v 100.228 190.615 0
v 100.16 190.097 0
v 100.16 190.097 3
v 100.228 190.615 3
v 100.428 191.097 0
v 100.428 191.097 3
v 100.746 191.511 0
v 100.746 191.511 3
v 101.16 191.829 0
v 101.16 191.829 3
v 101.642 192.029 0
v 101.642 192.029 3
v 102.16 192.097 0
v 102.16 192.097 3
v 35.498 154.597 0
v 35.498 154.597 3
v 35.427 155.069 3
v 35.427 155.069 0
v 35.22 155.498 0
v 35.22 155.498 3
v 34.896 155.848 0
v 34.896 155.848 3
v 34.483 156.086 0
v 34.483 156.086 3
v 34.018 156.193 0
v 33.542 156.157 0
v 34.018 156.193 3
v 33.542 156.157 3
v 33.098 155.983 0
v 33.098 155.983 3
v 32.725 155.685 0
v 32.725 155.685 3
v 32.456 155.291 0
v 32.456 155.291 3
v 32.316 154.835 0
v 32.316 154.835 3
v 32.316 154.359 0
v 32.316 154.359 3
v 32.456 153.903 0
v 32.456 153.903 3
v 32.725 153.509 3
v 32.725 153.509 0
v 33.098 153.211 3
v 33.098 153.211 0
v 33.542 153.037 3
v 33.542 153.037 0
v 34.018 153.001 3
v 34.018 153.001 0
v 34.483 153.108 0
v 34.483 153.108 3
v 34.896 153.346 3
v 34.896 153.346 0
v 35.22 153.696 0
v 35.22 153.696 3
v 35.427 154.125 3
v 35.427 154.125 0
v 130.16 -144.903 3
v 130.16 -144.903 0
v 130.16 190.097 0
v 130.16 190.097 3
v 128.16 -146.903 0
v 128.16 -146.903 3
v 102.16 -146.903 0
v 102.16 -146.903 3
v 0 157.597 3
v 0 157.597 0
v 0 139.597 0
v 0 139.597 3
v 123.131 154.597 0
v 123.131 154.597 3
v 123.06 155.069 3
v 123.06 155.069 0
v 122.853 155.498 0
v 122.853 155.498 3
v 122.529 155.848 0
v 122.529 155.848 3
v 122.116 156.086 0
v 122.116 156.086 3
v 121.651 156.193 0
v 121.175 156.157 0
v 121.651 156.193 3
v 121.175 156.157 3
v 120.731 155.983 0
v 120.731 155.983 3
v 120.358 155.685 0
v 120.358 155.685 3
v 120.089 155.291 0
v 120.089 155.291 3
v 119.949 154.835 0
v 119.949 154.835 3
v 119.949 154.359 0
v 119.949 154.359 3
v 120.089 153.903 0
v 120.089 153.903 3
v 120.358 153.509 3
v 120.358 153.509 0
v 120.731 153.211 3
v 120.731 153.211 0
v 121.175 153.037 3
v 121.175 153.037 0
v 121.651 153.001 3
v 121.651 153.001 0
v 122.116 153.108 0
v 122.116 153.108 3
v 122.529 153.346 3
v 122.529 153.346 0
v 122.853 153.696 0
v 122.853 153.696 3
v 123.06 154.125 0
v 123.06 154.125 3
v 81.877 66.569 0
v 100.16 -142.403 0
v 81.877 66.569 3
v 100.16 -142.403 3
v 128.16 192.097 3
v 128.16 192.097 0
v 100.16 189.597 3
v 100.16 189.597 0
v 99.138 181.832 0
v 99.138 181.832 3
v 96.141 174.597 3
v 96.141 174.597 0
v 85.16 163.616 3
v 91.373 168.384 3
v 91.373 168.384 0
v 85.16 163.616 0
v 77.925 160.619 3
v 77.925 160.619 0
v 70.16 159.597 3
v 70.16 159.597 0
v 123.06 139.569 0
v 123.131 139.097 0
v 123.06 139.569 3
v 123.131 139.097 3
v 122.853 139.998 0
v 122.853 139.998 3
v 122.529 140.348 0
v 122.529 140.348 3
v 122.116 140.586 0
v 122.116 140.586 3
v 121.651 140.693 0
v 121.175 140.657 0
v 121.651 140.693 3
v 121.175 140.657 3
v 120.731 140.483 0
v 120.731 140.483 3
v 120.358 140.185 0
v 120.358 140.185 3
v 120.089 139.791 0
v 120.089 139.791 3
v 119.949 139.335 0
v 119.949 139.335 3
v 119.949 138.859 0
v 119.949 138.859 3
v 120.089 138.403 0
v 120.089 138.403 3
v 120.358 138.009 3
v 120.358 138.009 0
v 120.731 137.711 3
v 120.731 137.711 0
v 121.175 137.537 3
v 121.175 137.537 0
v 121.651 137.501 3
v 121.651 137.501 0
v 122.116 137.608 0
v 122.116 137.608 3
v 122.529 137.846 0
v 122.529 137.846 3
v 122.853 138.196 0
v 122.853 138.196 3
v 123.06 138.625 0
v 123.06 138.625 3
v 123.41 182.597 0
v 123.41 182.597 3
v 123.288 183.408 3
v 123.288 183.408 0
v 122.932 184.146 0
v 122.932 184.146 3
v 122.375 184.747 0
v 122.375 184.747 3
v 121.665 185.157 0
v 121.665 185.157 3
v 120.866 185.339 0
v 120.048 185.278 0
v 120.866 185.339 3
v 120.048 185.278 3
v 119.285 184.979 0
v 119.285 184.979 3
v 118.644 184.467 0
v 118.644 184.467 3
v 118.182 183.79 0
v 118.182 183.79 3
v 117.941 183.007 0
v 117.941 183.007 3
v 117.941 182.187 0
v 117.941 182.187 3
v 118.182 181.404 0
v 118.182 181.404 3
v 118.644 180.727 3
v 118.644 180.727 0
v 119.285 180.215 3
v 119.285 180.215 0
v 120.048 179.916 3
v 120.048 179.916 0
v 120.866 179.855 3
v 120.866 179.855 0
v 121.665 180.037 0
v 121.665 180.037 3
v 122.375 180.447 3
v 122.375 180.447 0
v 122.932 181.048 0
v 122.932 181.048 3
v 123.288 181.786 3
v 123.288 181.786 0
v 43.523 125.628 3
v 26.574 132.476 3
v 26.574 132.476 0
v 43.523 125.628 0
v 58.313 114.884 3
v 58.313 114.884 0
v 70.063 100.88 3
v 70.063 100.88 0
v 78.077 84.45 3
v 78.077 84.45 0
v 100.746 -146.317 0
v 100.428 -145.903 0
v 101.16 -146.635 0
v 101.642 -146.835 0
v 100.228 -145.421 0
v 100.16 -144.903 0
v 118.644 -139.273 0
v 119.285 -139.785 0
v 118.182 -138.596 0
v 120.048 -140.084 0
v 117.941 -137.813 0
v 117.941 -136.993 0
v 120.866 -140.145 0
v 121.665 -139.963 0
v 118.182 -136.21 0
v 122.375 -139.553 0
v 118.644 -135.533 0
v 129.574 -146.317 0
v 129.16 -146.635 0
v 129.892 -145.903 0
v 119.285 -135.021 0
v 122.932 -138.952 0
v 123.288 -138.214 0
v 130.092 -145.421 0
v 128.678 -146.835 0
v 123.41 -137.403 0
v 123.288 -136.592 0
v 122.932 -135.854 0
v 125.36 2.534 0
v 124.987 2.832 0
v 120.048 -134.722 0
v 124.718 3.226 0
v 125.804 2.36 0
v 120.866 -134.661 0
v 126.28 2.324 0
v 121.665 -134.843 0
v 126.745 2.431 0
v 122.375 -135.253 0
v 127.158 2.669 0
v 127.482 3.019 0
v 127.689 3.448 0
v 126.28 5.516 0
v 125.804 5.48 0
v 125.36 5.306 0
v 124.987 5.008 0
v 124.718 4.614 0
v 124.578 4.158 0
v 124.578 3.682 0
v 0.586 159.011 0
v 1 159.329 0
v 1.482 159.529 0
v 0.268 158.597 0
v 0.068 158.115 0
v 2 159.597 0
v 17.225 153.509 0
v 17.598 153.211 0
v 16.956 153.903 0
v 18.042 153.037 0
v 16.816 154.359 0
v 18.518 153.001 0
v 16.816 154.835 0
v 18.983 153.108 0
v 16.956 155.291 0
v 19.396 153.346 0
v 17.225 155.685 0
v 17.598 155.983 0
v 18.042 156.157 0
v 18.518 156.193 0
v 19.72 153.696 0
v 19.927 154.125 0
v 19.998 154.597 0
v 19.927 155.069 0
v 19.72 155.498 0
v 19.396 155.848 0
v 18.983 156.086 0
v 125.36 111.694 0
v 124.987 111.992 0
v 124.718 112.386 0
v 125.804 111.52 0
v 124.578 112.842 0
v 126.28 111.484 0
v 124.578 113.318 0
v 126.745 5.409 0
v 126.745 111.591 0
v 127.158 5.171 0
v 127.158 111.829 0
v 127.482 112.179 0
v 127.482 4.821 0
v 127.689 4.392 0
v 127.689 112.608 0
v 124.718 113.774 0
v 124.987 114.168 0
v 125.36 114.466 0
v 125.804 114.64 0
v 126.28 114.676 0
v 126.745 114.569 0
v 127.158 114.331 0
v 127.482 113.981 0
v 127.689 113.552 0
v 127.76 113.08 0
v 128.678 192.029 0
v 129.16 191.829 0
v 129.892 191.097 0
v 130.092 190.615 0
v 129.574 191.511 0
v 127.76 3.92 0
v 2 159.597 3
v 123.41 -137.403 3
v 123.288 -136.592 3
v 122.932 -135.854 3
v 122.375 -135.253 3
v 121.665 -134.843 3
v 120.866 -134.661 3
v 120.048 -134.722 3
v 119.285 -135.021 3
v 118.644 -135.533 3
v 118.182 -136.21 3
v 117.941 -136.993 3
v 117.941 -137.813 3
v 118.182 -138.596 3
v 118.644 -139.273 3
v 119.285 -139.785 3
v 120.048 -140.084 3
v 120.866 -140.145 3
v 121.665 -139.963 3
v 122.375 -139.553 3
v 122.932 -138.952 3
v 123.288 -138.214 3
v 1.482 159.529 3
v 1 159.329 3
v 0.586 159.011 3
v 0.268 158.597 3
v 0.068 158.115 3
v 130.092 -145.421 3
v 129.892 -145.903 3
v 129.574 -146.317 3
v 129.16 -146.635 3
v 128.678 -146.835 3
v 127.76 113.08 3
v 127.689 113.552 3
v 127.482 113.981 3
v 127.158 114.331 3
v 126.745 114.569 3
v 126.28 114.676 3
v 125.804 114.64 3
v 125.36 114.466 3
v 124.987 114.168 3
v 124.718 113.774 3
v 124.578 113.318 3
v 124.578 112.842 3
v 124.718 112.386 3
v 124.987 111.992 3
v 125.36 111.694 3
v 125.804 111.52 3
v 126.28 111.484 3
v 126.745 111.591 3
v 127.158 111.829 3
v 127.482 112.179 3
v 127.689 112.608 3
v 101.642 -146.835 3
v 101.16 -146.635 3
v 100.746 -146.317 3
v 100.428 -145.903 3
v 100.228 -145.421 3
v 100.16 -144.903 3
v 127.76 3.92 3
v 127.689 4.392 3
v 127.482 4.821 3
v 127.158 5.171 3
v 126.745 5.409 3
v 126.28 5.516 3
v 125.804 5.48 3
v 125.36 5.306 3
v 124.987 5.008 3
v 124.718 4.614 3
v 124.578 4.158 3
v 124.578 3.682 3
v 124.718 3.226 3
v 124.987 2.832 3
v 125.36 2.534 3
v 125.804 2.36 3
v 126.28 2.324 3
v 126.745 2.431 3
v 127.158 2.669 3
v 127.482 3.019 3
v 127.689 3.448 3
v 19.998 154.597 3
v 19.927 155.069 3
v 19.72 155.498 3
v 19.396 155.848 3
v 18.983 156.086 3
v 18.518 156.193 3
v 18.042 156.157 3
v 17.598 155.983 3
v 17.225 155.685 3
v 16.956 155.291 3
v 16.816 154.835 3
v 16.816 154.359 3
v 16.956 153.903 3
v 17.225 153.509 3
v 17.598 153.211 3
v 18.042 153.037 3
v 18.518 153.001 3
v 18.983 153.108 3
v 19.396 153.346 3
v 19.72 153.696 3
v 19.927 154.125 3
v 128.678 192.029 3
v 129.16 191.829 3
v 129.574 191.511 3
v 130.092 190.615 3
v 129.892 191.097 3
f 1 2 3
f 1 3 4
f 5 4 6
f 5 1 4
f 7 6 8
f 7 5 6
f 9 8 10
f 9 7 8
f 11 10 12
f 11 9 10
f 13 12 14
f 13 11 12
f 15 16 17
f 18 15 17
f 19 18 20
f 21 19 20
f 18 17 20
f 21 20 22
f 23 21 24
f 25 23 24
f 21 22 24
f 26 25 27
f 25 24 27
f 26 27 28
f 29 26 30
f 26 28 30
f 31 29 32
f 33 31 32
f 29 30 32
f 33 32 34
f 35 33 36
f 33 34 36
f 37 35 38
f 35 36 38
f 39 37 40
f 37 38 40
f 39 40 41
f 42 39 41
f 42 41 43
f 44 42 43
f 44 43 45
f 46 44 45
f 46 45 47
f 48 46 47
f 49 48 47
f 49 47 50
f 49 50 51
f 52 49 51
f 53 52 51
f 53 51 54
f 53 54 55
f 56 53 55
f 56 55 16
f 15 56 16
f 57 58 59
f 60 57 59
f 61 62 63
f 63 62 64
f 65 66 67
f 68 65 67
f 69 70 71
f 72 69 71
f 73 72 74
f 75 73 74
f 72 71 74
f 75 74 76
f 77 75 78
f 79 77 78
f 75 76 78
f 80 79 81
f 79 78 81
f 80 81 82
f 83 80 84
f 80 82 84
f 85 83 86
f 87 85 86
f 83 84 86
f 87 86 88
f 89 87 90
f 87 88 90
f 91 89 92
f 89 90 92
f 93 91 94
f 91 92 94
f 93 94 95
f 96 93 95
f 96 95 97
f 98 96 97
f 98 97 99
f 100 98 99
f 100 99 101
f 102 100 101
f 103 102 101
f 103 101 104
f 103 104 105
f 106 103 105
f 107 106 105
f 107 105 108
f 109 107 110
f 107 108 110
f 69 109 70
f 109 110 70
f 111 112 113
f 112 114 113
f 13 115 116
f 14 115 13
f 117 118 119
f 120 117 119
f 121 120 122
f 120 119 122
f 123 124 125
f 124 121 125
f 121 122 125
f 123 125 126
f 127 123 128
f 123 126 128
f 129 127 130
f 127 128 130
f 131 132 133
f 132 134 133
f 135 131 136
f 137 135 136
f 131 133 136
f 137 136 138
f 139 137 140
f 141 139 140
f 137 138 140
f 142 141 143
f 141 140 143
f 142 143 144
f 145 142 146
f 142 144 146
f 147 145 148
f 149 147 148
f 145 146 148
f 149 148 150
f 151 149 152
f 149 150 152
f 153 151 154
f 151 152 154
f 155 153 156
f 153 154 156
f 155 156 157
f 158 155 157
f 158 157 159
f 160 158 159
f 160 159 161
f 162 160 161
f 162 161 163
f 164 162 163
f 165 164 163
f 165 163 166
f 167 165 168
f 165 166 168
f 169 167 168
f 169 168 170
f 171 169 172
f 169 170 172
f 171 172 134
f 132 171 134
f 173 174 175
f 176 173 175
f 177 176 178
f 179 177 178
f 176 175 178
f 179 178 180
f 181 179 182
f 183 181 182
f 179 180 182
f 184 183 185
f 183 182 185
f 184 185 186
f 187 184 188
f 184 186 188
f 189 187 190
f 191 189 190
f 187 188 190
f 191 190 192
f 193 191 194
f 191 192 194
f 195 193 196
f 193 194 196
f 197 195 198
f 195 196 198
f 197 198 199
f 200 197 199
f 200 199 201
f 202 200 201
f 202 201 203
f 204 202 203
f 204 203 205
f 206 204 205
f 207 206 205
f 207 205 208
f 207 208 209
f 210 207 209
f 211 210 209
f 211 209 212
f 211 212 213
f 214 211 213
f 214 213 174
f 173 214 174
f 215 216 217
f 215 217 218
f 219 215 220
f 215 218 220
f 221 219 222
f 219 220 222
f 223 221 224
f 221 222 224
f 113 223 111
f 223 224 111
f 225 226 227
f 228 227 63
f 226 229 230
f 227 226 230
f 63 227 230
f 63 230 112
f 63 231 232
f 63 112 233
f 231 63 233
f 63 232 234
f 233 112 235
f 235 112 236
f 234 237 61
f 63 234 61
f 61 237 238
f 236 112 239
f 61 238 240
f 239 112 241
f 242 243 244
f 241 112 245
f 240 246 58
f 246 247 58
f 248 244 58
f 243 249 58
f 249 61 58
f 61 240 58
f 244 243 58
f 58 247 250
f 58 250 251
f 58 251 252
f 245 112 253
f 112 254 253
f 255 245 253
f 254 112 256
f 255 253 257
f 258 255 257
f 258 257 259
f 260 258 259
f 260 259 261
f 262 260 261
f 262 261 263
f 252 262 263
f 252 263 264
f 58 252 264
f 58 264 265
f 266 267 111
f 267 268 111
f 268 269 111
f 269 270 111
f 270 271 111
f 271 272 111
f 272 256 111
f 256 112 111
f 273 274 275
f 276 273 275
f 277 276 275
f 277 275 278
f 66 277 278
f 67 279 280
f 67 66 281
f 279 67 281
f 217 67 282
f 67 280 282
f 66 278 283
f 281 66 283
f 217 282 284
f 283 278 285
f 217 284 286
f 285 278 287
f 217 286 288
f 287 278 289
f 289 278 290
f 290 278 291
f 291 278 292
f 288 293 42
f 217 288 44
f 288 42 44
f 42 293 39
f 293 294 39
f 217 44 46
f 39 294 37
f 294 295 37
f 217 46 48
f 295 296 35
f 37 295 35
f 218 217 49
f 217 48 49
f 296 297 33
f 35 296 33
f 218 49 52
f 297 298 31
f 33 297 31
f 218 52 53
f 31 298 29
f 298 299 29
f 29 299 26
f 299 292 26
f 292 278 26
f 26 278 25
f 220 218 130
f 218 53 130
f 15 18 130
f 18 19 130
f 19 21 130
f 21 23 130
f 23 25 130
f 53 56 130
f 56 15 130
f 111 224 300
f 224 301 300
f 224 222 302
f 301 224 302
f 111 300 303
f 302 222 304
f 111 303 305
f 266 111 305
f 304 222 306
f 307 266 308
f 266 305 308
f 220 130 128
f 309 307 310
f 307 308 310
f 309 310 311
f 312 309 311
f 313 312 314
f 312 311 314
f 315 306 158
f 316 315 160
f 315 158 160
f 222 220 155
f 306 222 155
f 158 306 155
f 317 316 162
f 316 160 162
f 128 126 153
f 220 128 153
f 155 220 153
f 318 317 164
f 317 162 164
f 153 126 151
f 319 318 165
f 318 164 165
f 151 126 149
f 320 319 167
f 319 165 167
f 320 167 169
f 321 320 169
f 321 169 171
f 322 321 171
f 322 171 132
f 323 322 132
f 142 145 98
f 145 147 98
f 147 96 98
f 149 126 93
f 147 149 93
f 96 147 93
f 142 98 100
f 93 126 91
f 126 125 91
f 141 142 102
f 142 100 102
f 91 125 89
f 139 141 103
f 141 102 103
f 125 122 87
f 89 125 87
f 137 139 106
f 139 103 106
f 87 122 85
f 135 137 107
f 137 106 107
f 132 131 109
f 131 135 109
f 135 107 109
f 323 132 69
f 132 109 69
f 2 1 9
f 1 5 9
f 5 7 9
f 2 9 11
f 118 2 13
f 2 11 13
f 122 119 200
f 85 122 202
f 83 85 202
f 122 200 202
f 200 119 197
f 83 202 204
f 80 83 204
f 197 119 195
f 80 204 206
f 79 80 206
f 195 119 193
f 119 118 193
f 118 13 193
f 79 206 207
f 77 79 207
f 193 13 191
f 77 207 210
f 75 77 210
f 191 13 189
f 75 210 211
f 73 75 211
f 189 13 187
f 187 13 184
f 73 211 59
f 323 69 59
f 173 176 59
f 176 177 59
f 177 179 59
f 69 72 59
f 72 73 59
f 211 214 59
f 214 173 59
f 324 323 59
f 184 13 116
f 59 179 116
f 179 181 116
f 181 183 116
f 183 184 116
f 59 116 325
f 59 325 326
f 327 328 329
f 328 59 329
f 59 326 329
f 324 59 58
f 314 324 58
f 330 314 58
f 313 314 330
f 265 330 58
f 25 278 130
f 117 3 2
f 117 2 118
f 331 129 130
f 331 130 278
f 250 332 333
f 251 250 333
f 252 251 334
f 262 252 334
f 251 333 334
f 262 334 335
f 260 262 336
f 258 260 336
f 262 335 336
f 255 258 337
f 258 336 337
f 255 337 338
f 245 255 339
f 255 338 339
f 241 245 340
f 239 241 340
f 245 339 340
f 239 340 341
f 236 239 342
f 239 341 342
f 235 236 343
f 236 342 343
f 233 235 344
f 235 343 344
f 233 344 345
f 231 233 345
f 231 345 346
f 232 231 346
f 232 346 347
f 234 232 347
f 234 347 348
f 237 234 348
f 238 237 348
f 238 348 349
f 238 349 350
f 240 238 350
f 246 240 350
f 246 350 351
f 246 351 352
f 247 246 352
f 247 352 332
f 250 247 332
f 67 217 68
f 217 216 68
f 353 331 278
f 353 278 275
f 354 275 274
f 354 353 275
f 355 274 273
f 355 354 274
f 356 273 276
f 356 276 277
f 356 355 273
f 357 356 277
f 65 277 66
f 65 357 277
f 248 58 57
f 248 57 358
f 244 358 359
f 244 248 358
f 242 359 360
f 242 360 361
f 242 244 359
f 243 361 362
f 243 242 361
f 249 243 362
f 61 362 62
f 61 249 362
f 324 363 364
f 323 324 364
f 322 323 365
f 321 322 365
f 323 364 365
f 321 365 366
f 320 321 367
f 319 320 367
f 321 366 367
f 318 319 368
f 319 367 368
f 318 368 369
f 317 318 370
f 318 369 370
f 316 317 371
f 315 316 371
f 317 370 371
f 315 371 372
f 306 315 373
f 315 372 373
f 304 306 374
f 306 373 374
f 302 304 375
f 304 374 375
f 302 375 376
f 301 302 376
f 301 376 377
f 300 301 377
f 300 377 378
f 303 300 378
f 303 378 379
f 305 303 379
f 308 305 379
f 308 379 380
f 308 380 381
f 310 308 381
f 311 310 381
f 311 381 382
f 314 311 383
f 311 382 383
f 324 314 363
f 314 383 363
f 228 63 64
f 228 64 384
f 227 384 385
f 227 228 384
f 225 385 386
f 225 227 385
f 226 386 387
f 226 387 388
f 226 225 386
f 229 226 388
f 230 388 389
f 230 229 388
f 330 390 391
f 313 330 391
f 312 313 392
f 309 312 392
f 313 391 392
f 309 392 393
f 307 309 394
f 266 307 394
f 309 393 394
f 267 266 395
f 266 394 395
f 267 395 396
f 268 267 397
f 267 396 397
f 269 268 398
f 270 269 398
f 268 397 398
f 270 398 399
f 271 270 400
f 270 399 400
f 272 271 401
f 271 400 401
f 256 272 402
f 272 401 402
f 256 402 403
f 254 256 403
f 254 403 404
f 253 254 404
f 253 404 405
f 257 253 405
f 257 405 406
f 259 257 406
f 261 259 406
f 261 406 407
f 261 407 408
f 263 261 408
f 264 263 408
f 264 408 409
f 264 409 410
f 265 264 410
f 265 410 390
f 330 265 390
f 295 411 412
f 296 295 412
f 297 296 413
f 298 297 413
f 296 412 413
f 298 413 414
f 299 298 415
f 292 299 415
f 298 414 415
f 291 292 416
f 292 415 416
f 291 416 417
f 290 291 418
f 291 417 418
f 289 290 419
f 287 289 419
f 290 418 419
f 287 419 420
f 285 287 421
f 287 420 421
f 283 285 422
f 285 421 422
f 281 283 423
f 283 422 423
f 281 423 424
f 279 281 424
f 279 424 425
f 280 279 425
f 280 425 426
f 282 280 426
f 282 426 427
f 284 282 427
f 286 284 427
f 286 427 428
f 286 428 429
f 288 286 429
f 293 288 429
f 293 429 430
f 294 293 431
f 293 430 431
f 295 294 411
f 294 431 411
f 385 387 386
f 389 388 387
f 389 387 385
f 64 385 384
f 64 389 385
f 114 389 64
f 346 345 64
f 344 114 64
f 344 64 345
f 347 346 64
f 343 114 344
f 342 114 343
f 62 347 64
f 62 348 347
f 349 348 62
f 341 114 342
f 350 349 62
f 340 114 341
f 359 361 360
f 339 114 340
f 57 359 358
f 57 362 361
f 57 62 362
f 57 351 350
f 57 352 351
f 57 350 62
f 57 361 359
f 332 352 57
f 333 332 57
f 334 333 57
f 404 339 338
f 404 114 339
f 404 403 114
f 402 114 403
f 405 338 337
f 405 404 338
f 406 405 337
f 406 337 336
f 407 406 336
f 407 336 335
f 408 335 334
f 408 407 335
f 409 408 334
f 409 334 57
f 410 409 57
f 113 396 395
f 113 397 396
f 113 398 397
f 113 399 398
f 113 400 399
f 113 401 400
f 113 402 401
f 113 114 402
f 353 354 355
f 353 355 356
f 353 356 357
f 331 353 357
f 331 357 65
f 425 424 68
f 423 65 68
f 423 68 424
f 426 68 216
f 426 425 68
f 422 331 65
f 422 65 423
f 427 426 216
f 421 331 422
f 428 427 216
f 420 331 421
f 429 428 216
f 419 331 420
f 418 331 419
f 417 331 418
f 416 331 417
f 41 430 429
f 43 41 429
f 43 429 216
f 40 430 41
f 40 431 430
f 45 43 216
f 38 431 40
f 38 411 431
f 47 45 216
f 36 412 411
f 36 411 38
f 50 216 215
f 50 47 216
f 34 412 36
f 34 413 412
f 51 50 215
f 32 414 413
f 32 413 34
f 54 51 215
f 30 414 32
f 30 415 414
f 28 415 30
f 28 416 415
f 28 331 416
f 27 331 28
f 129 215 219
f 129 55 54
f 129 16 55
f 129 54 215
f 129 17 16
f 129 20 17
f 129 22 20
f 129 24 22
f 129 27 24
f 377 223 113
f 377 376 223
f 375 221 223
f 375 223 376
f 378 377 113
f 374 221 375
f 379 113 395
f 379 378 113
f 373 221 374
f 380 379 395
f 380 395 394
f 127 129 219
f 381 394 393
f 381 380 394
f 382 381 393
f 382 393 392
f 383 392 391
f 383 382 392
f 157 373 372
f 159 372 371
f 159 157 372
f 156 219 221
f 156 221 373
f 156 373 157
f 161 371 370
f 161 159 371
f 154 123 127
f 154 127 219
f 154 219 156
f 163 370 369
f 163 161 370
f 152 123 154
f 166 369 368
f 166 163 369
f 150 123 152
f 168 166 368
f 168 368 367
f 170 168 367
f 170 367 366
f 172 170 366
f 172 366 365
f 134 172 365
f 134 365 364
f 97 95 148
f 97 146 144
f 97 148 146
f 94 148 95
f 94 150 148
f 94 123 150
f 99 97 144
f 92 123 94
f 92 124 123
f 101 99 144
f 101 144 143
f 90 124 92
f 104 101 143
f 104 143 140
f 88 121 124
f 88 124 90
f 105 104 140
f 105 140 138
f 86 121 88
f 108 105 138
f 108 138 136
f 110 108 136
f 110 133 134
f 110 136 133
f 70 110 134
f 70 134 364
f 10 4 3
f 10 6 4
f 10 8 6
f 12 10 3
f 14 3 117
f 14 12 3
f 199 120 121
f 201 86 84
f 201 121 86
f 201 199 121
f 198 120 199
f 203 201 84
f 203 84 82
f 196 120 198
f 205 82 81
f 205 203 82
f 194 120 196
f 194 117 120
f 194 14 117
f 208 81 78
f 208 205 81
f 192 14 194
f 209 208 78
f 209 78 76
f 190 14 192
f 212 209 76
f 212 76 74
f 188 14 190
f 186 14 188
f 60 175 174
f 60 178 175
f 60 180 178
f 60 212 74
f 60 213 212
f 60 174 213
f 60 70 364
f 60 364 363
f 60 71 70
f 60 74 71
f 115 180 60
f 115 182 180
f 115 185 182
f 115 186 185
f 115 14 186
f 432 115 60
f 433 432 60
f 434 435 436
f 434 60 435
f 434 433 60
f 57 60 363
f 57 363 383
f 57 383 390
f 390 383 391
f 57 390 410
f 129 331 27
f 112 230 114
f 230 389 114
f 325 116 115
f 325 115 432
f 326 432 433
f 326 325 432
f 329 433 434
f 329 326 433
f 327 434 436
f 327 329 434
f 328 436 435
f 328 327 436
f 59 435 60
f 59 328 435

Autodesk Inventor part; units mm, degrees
ref_plane "YZ Plane" through (0, 0, 0) normal (1, 0, 0) x (0, 1, 0)
ref_plane "XZ Plane" through (0, 0, 0) normal (0, 1, 0) x (-1, 0, 0)
ref_plane "XY Plane" through (0, 0, 0) normal (0, 0, 1) x (1, 0, 0)
sketch "スケッチ1" plane through (0, 0, 0) normal (0, 0, 1) x (1, 0, 0)
  line L0 (0, 0) -> (130.16, 0)
  line L1 (130.16, 0) -> (130.16, 159.597)
  line L2 (130.16, 159.597) -> (0, 159.597)
  line L3 (0, 159.597) -> (0, 0)
  dimension "d0" = 130.16
  dimension "d1" = 159.597
extrude "押し出し1" add sketch "スケッチ1" along normal blind 3
sketch "スケッチ2" plane through (0, 0, 3) normal (0, 0, 1) x (1, 0, 0)
  line L0 (126.16, 3.92) -> (126.16, 113.08) construction
  circle A0 centre (126.16, 3.92) radius 1.6
  circle A1 centre (126.16, 113.08) radius 1.6
  line L1 (130.16, 0) -> (130.16, 159.597) projected
  line L2 (0, 0) -> (130.16, 0) projected
  circle A2 centre (121.531, 154.597) radius 1.6
  line L3 (130.16, 159.597) -> (0, 159.597) projected
  line L4 (121.531, 154.597) -> (121.531, 139.097) construction
  circle A3 centre (121.531, 139.097) radius 1.6
  line L5 (18.398, 154.597) -> (33.898, 154.597) construction
  line L6 (0, 159.597) -> (0, 0) construction
  circle A4 centre (18.398, 154.597) radius 1.6
  circle A5 centre (33.898, 154.597) radius 1.6
  dimension "d4" = 3.2
  dimension "d5" = 4
  dimension "d6" = 3.92
  dimension "d7" = 109.16
  dimension "d10" = 5
  dimension "d11" = 8.629
  dimension "d12" = 15.5
  dimension "d13" = 18.398
  dimension "d14" = 5
  dimension "d15" = 15.5
extrude "押し出し2" cut sketch "スケッチ2" against normal blind 3
sketch "スケッチ9" plane through (0, 0, 3) normal (0, 0, 1) x (1, 0, 0)
  line L0 (130.16, 159.597) -> (0, 159.597)
  line L1 (100.16, 192.597) -> (130.16, 192.597)
  line L2 (130.16, 192.597) -> (130.16, 159.597)
  line L3 (100.16, 192.597) -> (100.16, 187.597)
  line L4 (130.16, 159.597) -> (0, 159.597) projected
  line L5 (100.16, 187.597) -> (0, 159.597)
  line L6 (130.16, 0) -> (130.16, -147.403)
  line L7 (130.16, -147.403) -> (100.16, -147.403)
  line L8 (100.16, -147.403) -> (100.16, -142.403)
  line L9 (100.16, -142.403) -> (0, 0)
  line L10 (0, 0) -> (130.16, 0)
  circle A0 centre (120.66, 182.597) radius 2.75
  circle A1 centre (120.66, -137.403) radius 2.75
  line L11 (130.16, 192.097) -> (100.16, 192.097)
  line L12 (130.16, -146.903) -> (100.16, -146.903)
  dimension "d50" = 33
  dimension "d51" = 30
  dimension "d52" = 5
  dimension "d53" = 340
  dimension "d54" = 10
  dimension "d55" = 9.5
  dimension "d56" = 0.5
  dimension "d57" = 5.5
  dimension "d58" = 9.5
  dimension "d59" = 10
  dimension "d60" = 0.5
extrude "押し出し8" add sketch "スケッチ9" against normal blind 3 contours L0 L5 L3 L11 L2 | L6 L12 L8 L9 L10
sketch "スケッチ10" plane through (0, 0, 3) normal (0, 0, 1) x (1, 0, 0)
  line L0 (100.16, -146.903) -> (100.16, -142.403) projected
  line L1 (100.16, -142.403) -> (77.3003, 118.8844)
  line L2 (77.3003, 118.8844) -> (0, 139.597)
  line L3 (0, 159.597) -> (0, 0) projected
  line L4 (0, 139.597) -> (0, 0)
  line L5 (0, 0) -> (100.16, -142.403)
  line L6 (130.16, -146.903) -> (130.16, 192.097) projected
  dimension "d63" = 20
  dimension "d64" = 105
  dimension "d65" = 5
extrude "押し出し9" cut sketch "スケッチ10" against normal blind 3
fillet "フィレット2" radius 75 1 edges at (77.3003, 118.8844, 1.5)
sketch "スケッチ12" plane through (0, 0, 3) normal (0, 0, 1) x (1, 0, 0)
  line L0 (100.16, 187.597) -> (100.16, 159.597)
  line L1 (100.16, 159.597) -> (0, 159.597)
  line L2 (0, 159.597) -> (100.16, 187.597)
  line L3 (0, 159.597) -> (0, 139.597) projected
  point P0 (0, 0)
extrude "押し出し10" cut sketch "スケッチ12" against normal blind 3
fillet "フィレット4" radius 30 1 edges at (100.16, 159.597, 1.5)
fillet "フィレット5" radius 2 5 edges at (100.16, 192.097, 1.5) (0, 159.597, 1.5) (100.16, -146.903, 1.5) (130.16, -146.903, 1.5) (130.16, 192.097, 1.5)
equation "\"d58\" = d55"
equation "\"d59\" = d54"
equation "\"d60\" = d56"
properties part number "small_gpu_05" material "アルミニウム 6061"
